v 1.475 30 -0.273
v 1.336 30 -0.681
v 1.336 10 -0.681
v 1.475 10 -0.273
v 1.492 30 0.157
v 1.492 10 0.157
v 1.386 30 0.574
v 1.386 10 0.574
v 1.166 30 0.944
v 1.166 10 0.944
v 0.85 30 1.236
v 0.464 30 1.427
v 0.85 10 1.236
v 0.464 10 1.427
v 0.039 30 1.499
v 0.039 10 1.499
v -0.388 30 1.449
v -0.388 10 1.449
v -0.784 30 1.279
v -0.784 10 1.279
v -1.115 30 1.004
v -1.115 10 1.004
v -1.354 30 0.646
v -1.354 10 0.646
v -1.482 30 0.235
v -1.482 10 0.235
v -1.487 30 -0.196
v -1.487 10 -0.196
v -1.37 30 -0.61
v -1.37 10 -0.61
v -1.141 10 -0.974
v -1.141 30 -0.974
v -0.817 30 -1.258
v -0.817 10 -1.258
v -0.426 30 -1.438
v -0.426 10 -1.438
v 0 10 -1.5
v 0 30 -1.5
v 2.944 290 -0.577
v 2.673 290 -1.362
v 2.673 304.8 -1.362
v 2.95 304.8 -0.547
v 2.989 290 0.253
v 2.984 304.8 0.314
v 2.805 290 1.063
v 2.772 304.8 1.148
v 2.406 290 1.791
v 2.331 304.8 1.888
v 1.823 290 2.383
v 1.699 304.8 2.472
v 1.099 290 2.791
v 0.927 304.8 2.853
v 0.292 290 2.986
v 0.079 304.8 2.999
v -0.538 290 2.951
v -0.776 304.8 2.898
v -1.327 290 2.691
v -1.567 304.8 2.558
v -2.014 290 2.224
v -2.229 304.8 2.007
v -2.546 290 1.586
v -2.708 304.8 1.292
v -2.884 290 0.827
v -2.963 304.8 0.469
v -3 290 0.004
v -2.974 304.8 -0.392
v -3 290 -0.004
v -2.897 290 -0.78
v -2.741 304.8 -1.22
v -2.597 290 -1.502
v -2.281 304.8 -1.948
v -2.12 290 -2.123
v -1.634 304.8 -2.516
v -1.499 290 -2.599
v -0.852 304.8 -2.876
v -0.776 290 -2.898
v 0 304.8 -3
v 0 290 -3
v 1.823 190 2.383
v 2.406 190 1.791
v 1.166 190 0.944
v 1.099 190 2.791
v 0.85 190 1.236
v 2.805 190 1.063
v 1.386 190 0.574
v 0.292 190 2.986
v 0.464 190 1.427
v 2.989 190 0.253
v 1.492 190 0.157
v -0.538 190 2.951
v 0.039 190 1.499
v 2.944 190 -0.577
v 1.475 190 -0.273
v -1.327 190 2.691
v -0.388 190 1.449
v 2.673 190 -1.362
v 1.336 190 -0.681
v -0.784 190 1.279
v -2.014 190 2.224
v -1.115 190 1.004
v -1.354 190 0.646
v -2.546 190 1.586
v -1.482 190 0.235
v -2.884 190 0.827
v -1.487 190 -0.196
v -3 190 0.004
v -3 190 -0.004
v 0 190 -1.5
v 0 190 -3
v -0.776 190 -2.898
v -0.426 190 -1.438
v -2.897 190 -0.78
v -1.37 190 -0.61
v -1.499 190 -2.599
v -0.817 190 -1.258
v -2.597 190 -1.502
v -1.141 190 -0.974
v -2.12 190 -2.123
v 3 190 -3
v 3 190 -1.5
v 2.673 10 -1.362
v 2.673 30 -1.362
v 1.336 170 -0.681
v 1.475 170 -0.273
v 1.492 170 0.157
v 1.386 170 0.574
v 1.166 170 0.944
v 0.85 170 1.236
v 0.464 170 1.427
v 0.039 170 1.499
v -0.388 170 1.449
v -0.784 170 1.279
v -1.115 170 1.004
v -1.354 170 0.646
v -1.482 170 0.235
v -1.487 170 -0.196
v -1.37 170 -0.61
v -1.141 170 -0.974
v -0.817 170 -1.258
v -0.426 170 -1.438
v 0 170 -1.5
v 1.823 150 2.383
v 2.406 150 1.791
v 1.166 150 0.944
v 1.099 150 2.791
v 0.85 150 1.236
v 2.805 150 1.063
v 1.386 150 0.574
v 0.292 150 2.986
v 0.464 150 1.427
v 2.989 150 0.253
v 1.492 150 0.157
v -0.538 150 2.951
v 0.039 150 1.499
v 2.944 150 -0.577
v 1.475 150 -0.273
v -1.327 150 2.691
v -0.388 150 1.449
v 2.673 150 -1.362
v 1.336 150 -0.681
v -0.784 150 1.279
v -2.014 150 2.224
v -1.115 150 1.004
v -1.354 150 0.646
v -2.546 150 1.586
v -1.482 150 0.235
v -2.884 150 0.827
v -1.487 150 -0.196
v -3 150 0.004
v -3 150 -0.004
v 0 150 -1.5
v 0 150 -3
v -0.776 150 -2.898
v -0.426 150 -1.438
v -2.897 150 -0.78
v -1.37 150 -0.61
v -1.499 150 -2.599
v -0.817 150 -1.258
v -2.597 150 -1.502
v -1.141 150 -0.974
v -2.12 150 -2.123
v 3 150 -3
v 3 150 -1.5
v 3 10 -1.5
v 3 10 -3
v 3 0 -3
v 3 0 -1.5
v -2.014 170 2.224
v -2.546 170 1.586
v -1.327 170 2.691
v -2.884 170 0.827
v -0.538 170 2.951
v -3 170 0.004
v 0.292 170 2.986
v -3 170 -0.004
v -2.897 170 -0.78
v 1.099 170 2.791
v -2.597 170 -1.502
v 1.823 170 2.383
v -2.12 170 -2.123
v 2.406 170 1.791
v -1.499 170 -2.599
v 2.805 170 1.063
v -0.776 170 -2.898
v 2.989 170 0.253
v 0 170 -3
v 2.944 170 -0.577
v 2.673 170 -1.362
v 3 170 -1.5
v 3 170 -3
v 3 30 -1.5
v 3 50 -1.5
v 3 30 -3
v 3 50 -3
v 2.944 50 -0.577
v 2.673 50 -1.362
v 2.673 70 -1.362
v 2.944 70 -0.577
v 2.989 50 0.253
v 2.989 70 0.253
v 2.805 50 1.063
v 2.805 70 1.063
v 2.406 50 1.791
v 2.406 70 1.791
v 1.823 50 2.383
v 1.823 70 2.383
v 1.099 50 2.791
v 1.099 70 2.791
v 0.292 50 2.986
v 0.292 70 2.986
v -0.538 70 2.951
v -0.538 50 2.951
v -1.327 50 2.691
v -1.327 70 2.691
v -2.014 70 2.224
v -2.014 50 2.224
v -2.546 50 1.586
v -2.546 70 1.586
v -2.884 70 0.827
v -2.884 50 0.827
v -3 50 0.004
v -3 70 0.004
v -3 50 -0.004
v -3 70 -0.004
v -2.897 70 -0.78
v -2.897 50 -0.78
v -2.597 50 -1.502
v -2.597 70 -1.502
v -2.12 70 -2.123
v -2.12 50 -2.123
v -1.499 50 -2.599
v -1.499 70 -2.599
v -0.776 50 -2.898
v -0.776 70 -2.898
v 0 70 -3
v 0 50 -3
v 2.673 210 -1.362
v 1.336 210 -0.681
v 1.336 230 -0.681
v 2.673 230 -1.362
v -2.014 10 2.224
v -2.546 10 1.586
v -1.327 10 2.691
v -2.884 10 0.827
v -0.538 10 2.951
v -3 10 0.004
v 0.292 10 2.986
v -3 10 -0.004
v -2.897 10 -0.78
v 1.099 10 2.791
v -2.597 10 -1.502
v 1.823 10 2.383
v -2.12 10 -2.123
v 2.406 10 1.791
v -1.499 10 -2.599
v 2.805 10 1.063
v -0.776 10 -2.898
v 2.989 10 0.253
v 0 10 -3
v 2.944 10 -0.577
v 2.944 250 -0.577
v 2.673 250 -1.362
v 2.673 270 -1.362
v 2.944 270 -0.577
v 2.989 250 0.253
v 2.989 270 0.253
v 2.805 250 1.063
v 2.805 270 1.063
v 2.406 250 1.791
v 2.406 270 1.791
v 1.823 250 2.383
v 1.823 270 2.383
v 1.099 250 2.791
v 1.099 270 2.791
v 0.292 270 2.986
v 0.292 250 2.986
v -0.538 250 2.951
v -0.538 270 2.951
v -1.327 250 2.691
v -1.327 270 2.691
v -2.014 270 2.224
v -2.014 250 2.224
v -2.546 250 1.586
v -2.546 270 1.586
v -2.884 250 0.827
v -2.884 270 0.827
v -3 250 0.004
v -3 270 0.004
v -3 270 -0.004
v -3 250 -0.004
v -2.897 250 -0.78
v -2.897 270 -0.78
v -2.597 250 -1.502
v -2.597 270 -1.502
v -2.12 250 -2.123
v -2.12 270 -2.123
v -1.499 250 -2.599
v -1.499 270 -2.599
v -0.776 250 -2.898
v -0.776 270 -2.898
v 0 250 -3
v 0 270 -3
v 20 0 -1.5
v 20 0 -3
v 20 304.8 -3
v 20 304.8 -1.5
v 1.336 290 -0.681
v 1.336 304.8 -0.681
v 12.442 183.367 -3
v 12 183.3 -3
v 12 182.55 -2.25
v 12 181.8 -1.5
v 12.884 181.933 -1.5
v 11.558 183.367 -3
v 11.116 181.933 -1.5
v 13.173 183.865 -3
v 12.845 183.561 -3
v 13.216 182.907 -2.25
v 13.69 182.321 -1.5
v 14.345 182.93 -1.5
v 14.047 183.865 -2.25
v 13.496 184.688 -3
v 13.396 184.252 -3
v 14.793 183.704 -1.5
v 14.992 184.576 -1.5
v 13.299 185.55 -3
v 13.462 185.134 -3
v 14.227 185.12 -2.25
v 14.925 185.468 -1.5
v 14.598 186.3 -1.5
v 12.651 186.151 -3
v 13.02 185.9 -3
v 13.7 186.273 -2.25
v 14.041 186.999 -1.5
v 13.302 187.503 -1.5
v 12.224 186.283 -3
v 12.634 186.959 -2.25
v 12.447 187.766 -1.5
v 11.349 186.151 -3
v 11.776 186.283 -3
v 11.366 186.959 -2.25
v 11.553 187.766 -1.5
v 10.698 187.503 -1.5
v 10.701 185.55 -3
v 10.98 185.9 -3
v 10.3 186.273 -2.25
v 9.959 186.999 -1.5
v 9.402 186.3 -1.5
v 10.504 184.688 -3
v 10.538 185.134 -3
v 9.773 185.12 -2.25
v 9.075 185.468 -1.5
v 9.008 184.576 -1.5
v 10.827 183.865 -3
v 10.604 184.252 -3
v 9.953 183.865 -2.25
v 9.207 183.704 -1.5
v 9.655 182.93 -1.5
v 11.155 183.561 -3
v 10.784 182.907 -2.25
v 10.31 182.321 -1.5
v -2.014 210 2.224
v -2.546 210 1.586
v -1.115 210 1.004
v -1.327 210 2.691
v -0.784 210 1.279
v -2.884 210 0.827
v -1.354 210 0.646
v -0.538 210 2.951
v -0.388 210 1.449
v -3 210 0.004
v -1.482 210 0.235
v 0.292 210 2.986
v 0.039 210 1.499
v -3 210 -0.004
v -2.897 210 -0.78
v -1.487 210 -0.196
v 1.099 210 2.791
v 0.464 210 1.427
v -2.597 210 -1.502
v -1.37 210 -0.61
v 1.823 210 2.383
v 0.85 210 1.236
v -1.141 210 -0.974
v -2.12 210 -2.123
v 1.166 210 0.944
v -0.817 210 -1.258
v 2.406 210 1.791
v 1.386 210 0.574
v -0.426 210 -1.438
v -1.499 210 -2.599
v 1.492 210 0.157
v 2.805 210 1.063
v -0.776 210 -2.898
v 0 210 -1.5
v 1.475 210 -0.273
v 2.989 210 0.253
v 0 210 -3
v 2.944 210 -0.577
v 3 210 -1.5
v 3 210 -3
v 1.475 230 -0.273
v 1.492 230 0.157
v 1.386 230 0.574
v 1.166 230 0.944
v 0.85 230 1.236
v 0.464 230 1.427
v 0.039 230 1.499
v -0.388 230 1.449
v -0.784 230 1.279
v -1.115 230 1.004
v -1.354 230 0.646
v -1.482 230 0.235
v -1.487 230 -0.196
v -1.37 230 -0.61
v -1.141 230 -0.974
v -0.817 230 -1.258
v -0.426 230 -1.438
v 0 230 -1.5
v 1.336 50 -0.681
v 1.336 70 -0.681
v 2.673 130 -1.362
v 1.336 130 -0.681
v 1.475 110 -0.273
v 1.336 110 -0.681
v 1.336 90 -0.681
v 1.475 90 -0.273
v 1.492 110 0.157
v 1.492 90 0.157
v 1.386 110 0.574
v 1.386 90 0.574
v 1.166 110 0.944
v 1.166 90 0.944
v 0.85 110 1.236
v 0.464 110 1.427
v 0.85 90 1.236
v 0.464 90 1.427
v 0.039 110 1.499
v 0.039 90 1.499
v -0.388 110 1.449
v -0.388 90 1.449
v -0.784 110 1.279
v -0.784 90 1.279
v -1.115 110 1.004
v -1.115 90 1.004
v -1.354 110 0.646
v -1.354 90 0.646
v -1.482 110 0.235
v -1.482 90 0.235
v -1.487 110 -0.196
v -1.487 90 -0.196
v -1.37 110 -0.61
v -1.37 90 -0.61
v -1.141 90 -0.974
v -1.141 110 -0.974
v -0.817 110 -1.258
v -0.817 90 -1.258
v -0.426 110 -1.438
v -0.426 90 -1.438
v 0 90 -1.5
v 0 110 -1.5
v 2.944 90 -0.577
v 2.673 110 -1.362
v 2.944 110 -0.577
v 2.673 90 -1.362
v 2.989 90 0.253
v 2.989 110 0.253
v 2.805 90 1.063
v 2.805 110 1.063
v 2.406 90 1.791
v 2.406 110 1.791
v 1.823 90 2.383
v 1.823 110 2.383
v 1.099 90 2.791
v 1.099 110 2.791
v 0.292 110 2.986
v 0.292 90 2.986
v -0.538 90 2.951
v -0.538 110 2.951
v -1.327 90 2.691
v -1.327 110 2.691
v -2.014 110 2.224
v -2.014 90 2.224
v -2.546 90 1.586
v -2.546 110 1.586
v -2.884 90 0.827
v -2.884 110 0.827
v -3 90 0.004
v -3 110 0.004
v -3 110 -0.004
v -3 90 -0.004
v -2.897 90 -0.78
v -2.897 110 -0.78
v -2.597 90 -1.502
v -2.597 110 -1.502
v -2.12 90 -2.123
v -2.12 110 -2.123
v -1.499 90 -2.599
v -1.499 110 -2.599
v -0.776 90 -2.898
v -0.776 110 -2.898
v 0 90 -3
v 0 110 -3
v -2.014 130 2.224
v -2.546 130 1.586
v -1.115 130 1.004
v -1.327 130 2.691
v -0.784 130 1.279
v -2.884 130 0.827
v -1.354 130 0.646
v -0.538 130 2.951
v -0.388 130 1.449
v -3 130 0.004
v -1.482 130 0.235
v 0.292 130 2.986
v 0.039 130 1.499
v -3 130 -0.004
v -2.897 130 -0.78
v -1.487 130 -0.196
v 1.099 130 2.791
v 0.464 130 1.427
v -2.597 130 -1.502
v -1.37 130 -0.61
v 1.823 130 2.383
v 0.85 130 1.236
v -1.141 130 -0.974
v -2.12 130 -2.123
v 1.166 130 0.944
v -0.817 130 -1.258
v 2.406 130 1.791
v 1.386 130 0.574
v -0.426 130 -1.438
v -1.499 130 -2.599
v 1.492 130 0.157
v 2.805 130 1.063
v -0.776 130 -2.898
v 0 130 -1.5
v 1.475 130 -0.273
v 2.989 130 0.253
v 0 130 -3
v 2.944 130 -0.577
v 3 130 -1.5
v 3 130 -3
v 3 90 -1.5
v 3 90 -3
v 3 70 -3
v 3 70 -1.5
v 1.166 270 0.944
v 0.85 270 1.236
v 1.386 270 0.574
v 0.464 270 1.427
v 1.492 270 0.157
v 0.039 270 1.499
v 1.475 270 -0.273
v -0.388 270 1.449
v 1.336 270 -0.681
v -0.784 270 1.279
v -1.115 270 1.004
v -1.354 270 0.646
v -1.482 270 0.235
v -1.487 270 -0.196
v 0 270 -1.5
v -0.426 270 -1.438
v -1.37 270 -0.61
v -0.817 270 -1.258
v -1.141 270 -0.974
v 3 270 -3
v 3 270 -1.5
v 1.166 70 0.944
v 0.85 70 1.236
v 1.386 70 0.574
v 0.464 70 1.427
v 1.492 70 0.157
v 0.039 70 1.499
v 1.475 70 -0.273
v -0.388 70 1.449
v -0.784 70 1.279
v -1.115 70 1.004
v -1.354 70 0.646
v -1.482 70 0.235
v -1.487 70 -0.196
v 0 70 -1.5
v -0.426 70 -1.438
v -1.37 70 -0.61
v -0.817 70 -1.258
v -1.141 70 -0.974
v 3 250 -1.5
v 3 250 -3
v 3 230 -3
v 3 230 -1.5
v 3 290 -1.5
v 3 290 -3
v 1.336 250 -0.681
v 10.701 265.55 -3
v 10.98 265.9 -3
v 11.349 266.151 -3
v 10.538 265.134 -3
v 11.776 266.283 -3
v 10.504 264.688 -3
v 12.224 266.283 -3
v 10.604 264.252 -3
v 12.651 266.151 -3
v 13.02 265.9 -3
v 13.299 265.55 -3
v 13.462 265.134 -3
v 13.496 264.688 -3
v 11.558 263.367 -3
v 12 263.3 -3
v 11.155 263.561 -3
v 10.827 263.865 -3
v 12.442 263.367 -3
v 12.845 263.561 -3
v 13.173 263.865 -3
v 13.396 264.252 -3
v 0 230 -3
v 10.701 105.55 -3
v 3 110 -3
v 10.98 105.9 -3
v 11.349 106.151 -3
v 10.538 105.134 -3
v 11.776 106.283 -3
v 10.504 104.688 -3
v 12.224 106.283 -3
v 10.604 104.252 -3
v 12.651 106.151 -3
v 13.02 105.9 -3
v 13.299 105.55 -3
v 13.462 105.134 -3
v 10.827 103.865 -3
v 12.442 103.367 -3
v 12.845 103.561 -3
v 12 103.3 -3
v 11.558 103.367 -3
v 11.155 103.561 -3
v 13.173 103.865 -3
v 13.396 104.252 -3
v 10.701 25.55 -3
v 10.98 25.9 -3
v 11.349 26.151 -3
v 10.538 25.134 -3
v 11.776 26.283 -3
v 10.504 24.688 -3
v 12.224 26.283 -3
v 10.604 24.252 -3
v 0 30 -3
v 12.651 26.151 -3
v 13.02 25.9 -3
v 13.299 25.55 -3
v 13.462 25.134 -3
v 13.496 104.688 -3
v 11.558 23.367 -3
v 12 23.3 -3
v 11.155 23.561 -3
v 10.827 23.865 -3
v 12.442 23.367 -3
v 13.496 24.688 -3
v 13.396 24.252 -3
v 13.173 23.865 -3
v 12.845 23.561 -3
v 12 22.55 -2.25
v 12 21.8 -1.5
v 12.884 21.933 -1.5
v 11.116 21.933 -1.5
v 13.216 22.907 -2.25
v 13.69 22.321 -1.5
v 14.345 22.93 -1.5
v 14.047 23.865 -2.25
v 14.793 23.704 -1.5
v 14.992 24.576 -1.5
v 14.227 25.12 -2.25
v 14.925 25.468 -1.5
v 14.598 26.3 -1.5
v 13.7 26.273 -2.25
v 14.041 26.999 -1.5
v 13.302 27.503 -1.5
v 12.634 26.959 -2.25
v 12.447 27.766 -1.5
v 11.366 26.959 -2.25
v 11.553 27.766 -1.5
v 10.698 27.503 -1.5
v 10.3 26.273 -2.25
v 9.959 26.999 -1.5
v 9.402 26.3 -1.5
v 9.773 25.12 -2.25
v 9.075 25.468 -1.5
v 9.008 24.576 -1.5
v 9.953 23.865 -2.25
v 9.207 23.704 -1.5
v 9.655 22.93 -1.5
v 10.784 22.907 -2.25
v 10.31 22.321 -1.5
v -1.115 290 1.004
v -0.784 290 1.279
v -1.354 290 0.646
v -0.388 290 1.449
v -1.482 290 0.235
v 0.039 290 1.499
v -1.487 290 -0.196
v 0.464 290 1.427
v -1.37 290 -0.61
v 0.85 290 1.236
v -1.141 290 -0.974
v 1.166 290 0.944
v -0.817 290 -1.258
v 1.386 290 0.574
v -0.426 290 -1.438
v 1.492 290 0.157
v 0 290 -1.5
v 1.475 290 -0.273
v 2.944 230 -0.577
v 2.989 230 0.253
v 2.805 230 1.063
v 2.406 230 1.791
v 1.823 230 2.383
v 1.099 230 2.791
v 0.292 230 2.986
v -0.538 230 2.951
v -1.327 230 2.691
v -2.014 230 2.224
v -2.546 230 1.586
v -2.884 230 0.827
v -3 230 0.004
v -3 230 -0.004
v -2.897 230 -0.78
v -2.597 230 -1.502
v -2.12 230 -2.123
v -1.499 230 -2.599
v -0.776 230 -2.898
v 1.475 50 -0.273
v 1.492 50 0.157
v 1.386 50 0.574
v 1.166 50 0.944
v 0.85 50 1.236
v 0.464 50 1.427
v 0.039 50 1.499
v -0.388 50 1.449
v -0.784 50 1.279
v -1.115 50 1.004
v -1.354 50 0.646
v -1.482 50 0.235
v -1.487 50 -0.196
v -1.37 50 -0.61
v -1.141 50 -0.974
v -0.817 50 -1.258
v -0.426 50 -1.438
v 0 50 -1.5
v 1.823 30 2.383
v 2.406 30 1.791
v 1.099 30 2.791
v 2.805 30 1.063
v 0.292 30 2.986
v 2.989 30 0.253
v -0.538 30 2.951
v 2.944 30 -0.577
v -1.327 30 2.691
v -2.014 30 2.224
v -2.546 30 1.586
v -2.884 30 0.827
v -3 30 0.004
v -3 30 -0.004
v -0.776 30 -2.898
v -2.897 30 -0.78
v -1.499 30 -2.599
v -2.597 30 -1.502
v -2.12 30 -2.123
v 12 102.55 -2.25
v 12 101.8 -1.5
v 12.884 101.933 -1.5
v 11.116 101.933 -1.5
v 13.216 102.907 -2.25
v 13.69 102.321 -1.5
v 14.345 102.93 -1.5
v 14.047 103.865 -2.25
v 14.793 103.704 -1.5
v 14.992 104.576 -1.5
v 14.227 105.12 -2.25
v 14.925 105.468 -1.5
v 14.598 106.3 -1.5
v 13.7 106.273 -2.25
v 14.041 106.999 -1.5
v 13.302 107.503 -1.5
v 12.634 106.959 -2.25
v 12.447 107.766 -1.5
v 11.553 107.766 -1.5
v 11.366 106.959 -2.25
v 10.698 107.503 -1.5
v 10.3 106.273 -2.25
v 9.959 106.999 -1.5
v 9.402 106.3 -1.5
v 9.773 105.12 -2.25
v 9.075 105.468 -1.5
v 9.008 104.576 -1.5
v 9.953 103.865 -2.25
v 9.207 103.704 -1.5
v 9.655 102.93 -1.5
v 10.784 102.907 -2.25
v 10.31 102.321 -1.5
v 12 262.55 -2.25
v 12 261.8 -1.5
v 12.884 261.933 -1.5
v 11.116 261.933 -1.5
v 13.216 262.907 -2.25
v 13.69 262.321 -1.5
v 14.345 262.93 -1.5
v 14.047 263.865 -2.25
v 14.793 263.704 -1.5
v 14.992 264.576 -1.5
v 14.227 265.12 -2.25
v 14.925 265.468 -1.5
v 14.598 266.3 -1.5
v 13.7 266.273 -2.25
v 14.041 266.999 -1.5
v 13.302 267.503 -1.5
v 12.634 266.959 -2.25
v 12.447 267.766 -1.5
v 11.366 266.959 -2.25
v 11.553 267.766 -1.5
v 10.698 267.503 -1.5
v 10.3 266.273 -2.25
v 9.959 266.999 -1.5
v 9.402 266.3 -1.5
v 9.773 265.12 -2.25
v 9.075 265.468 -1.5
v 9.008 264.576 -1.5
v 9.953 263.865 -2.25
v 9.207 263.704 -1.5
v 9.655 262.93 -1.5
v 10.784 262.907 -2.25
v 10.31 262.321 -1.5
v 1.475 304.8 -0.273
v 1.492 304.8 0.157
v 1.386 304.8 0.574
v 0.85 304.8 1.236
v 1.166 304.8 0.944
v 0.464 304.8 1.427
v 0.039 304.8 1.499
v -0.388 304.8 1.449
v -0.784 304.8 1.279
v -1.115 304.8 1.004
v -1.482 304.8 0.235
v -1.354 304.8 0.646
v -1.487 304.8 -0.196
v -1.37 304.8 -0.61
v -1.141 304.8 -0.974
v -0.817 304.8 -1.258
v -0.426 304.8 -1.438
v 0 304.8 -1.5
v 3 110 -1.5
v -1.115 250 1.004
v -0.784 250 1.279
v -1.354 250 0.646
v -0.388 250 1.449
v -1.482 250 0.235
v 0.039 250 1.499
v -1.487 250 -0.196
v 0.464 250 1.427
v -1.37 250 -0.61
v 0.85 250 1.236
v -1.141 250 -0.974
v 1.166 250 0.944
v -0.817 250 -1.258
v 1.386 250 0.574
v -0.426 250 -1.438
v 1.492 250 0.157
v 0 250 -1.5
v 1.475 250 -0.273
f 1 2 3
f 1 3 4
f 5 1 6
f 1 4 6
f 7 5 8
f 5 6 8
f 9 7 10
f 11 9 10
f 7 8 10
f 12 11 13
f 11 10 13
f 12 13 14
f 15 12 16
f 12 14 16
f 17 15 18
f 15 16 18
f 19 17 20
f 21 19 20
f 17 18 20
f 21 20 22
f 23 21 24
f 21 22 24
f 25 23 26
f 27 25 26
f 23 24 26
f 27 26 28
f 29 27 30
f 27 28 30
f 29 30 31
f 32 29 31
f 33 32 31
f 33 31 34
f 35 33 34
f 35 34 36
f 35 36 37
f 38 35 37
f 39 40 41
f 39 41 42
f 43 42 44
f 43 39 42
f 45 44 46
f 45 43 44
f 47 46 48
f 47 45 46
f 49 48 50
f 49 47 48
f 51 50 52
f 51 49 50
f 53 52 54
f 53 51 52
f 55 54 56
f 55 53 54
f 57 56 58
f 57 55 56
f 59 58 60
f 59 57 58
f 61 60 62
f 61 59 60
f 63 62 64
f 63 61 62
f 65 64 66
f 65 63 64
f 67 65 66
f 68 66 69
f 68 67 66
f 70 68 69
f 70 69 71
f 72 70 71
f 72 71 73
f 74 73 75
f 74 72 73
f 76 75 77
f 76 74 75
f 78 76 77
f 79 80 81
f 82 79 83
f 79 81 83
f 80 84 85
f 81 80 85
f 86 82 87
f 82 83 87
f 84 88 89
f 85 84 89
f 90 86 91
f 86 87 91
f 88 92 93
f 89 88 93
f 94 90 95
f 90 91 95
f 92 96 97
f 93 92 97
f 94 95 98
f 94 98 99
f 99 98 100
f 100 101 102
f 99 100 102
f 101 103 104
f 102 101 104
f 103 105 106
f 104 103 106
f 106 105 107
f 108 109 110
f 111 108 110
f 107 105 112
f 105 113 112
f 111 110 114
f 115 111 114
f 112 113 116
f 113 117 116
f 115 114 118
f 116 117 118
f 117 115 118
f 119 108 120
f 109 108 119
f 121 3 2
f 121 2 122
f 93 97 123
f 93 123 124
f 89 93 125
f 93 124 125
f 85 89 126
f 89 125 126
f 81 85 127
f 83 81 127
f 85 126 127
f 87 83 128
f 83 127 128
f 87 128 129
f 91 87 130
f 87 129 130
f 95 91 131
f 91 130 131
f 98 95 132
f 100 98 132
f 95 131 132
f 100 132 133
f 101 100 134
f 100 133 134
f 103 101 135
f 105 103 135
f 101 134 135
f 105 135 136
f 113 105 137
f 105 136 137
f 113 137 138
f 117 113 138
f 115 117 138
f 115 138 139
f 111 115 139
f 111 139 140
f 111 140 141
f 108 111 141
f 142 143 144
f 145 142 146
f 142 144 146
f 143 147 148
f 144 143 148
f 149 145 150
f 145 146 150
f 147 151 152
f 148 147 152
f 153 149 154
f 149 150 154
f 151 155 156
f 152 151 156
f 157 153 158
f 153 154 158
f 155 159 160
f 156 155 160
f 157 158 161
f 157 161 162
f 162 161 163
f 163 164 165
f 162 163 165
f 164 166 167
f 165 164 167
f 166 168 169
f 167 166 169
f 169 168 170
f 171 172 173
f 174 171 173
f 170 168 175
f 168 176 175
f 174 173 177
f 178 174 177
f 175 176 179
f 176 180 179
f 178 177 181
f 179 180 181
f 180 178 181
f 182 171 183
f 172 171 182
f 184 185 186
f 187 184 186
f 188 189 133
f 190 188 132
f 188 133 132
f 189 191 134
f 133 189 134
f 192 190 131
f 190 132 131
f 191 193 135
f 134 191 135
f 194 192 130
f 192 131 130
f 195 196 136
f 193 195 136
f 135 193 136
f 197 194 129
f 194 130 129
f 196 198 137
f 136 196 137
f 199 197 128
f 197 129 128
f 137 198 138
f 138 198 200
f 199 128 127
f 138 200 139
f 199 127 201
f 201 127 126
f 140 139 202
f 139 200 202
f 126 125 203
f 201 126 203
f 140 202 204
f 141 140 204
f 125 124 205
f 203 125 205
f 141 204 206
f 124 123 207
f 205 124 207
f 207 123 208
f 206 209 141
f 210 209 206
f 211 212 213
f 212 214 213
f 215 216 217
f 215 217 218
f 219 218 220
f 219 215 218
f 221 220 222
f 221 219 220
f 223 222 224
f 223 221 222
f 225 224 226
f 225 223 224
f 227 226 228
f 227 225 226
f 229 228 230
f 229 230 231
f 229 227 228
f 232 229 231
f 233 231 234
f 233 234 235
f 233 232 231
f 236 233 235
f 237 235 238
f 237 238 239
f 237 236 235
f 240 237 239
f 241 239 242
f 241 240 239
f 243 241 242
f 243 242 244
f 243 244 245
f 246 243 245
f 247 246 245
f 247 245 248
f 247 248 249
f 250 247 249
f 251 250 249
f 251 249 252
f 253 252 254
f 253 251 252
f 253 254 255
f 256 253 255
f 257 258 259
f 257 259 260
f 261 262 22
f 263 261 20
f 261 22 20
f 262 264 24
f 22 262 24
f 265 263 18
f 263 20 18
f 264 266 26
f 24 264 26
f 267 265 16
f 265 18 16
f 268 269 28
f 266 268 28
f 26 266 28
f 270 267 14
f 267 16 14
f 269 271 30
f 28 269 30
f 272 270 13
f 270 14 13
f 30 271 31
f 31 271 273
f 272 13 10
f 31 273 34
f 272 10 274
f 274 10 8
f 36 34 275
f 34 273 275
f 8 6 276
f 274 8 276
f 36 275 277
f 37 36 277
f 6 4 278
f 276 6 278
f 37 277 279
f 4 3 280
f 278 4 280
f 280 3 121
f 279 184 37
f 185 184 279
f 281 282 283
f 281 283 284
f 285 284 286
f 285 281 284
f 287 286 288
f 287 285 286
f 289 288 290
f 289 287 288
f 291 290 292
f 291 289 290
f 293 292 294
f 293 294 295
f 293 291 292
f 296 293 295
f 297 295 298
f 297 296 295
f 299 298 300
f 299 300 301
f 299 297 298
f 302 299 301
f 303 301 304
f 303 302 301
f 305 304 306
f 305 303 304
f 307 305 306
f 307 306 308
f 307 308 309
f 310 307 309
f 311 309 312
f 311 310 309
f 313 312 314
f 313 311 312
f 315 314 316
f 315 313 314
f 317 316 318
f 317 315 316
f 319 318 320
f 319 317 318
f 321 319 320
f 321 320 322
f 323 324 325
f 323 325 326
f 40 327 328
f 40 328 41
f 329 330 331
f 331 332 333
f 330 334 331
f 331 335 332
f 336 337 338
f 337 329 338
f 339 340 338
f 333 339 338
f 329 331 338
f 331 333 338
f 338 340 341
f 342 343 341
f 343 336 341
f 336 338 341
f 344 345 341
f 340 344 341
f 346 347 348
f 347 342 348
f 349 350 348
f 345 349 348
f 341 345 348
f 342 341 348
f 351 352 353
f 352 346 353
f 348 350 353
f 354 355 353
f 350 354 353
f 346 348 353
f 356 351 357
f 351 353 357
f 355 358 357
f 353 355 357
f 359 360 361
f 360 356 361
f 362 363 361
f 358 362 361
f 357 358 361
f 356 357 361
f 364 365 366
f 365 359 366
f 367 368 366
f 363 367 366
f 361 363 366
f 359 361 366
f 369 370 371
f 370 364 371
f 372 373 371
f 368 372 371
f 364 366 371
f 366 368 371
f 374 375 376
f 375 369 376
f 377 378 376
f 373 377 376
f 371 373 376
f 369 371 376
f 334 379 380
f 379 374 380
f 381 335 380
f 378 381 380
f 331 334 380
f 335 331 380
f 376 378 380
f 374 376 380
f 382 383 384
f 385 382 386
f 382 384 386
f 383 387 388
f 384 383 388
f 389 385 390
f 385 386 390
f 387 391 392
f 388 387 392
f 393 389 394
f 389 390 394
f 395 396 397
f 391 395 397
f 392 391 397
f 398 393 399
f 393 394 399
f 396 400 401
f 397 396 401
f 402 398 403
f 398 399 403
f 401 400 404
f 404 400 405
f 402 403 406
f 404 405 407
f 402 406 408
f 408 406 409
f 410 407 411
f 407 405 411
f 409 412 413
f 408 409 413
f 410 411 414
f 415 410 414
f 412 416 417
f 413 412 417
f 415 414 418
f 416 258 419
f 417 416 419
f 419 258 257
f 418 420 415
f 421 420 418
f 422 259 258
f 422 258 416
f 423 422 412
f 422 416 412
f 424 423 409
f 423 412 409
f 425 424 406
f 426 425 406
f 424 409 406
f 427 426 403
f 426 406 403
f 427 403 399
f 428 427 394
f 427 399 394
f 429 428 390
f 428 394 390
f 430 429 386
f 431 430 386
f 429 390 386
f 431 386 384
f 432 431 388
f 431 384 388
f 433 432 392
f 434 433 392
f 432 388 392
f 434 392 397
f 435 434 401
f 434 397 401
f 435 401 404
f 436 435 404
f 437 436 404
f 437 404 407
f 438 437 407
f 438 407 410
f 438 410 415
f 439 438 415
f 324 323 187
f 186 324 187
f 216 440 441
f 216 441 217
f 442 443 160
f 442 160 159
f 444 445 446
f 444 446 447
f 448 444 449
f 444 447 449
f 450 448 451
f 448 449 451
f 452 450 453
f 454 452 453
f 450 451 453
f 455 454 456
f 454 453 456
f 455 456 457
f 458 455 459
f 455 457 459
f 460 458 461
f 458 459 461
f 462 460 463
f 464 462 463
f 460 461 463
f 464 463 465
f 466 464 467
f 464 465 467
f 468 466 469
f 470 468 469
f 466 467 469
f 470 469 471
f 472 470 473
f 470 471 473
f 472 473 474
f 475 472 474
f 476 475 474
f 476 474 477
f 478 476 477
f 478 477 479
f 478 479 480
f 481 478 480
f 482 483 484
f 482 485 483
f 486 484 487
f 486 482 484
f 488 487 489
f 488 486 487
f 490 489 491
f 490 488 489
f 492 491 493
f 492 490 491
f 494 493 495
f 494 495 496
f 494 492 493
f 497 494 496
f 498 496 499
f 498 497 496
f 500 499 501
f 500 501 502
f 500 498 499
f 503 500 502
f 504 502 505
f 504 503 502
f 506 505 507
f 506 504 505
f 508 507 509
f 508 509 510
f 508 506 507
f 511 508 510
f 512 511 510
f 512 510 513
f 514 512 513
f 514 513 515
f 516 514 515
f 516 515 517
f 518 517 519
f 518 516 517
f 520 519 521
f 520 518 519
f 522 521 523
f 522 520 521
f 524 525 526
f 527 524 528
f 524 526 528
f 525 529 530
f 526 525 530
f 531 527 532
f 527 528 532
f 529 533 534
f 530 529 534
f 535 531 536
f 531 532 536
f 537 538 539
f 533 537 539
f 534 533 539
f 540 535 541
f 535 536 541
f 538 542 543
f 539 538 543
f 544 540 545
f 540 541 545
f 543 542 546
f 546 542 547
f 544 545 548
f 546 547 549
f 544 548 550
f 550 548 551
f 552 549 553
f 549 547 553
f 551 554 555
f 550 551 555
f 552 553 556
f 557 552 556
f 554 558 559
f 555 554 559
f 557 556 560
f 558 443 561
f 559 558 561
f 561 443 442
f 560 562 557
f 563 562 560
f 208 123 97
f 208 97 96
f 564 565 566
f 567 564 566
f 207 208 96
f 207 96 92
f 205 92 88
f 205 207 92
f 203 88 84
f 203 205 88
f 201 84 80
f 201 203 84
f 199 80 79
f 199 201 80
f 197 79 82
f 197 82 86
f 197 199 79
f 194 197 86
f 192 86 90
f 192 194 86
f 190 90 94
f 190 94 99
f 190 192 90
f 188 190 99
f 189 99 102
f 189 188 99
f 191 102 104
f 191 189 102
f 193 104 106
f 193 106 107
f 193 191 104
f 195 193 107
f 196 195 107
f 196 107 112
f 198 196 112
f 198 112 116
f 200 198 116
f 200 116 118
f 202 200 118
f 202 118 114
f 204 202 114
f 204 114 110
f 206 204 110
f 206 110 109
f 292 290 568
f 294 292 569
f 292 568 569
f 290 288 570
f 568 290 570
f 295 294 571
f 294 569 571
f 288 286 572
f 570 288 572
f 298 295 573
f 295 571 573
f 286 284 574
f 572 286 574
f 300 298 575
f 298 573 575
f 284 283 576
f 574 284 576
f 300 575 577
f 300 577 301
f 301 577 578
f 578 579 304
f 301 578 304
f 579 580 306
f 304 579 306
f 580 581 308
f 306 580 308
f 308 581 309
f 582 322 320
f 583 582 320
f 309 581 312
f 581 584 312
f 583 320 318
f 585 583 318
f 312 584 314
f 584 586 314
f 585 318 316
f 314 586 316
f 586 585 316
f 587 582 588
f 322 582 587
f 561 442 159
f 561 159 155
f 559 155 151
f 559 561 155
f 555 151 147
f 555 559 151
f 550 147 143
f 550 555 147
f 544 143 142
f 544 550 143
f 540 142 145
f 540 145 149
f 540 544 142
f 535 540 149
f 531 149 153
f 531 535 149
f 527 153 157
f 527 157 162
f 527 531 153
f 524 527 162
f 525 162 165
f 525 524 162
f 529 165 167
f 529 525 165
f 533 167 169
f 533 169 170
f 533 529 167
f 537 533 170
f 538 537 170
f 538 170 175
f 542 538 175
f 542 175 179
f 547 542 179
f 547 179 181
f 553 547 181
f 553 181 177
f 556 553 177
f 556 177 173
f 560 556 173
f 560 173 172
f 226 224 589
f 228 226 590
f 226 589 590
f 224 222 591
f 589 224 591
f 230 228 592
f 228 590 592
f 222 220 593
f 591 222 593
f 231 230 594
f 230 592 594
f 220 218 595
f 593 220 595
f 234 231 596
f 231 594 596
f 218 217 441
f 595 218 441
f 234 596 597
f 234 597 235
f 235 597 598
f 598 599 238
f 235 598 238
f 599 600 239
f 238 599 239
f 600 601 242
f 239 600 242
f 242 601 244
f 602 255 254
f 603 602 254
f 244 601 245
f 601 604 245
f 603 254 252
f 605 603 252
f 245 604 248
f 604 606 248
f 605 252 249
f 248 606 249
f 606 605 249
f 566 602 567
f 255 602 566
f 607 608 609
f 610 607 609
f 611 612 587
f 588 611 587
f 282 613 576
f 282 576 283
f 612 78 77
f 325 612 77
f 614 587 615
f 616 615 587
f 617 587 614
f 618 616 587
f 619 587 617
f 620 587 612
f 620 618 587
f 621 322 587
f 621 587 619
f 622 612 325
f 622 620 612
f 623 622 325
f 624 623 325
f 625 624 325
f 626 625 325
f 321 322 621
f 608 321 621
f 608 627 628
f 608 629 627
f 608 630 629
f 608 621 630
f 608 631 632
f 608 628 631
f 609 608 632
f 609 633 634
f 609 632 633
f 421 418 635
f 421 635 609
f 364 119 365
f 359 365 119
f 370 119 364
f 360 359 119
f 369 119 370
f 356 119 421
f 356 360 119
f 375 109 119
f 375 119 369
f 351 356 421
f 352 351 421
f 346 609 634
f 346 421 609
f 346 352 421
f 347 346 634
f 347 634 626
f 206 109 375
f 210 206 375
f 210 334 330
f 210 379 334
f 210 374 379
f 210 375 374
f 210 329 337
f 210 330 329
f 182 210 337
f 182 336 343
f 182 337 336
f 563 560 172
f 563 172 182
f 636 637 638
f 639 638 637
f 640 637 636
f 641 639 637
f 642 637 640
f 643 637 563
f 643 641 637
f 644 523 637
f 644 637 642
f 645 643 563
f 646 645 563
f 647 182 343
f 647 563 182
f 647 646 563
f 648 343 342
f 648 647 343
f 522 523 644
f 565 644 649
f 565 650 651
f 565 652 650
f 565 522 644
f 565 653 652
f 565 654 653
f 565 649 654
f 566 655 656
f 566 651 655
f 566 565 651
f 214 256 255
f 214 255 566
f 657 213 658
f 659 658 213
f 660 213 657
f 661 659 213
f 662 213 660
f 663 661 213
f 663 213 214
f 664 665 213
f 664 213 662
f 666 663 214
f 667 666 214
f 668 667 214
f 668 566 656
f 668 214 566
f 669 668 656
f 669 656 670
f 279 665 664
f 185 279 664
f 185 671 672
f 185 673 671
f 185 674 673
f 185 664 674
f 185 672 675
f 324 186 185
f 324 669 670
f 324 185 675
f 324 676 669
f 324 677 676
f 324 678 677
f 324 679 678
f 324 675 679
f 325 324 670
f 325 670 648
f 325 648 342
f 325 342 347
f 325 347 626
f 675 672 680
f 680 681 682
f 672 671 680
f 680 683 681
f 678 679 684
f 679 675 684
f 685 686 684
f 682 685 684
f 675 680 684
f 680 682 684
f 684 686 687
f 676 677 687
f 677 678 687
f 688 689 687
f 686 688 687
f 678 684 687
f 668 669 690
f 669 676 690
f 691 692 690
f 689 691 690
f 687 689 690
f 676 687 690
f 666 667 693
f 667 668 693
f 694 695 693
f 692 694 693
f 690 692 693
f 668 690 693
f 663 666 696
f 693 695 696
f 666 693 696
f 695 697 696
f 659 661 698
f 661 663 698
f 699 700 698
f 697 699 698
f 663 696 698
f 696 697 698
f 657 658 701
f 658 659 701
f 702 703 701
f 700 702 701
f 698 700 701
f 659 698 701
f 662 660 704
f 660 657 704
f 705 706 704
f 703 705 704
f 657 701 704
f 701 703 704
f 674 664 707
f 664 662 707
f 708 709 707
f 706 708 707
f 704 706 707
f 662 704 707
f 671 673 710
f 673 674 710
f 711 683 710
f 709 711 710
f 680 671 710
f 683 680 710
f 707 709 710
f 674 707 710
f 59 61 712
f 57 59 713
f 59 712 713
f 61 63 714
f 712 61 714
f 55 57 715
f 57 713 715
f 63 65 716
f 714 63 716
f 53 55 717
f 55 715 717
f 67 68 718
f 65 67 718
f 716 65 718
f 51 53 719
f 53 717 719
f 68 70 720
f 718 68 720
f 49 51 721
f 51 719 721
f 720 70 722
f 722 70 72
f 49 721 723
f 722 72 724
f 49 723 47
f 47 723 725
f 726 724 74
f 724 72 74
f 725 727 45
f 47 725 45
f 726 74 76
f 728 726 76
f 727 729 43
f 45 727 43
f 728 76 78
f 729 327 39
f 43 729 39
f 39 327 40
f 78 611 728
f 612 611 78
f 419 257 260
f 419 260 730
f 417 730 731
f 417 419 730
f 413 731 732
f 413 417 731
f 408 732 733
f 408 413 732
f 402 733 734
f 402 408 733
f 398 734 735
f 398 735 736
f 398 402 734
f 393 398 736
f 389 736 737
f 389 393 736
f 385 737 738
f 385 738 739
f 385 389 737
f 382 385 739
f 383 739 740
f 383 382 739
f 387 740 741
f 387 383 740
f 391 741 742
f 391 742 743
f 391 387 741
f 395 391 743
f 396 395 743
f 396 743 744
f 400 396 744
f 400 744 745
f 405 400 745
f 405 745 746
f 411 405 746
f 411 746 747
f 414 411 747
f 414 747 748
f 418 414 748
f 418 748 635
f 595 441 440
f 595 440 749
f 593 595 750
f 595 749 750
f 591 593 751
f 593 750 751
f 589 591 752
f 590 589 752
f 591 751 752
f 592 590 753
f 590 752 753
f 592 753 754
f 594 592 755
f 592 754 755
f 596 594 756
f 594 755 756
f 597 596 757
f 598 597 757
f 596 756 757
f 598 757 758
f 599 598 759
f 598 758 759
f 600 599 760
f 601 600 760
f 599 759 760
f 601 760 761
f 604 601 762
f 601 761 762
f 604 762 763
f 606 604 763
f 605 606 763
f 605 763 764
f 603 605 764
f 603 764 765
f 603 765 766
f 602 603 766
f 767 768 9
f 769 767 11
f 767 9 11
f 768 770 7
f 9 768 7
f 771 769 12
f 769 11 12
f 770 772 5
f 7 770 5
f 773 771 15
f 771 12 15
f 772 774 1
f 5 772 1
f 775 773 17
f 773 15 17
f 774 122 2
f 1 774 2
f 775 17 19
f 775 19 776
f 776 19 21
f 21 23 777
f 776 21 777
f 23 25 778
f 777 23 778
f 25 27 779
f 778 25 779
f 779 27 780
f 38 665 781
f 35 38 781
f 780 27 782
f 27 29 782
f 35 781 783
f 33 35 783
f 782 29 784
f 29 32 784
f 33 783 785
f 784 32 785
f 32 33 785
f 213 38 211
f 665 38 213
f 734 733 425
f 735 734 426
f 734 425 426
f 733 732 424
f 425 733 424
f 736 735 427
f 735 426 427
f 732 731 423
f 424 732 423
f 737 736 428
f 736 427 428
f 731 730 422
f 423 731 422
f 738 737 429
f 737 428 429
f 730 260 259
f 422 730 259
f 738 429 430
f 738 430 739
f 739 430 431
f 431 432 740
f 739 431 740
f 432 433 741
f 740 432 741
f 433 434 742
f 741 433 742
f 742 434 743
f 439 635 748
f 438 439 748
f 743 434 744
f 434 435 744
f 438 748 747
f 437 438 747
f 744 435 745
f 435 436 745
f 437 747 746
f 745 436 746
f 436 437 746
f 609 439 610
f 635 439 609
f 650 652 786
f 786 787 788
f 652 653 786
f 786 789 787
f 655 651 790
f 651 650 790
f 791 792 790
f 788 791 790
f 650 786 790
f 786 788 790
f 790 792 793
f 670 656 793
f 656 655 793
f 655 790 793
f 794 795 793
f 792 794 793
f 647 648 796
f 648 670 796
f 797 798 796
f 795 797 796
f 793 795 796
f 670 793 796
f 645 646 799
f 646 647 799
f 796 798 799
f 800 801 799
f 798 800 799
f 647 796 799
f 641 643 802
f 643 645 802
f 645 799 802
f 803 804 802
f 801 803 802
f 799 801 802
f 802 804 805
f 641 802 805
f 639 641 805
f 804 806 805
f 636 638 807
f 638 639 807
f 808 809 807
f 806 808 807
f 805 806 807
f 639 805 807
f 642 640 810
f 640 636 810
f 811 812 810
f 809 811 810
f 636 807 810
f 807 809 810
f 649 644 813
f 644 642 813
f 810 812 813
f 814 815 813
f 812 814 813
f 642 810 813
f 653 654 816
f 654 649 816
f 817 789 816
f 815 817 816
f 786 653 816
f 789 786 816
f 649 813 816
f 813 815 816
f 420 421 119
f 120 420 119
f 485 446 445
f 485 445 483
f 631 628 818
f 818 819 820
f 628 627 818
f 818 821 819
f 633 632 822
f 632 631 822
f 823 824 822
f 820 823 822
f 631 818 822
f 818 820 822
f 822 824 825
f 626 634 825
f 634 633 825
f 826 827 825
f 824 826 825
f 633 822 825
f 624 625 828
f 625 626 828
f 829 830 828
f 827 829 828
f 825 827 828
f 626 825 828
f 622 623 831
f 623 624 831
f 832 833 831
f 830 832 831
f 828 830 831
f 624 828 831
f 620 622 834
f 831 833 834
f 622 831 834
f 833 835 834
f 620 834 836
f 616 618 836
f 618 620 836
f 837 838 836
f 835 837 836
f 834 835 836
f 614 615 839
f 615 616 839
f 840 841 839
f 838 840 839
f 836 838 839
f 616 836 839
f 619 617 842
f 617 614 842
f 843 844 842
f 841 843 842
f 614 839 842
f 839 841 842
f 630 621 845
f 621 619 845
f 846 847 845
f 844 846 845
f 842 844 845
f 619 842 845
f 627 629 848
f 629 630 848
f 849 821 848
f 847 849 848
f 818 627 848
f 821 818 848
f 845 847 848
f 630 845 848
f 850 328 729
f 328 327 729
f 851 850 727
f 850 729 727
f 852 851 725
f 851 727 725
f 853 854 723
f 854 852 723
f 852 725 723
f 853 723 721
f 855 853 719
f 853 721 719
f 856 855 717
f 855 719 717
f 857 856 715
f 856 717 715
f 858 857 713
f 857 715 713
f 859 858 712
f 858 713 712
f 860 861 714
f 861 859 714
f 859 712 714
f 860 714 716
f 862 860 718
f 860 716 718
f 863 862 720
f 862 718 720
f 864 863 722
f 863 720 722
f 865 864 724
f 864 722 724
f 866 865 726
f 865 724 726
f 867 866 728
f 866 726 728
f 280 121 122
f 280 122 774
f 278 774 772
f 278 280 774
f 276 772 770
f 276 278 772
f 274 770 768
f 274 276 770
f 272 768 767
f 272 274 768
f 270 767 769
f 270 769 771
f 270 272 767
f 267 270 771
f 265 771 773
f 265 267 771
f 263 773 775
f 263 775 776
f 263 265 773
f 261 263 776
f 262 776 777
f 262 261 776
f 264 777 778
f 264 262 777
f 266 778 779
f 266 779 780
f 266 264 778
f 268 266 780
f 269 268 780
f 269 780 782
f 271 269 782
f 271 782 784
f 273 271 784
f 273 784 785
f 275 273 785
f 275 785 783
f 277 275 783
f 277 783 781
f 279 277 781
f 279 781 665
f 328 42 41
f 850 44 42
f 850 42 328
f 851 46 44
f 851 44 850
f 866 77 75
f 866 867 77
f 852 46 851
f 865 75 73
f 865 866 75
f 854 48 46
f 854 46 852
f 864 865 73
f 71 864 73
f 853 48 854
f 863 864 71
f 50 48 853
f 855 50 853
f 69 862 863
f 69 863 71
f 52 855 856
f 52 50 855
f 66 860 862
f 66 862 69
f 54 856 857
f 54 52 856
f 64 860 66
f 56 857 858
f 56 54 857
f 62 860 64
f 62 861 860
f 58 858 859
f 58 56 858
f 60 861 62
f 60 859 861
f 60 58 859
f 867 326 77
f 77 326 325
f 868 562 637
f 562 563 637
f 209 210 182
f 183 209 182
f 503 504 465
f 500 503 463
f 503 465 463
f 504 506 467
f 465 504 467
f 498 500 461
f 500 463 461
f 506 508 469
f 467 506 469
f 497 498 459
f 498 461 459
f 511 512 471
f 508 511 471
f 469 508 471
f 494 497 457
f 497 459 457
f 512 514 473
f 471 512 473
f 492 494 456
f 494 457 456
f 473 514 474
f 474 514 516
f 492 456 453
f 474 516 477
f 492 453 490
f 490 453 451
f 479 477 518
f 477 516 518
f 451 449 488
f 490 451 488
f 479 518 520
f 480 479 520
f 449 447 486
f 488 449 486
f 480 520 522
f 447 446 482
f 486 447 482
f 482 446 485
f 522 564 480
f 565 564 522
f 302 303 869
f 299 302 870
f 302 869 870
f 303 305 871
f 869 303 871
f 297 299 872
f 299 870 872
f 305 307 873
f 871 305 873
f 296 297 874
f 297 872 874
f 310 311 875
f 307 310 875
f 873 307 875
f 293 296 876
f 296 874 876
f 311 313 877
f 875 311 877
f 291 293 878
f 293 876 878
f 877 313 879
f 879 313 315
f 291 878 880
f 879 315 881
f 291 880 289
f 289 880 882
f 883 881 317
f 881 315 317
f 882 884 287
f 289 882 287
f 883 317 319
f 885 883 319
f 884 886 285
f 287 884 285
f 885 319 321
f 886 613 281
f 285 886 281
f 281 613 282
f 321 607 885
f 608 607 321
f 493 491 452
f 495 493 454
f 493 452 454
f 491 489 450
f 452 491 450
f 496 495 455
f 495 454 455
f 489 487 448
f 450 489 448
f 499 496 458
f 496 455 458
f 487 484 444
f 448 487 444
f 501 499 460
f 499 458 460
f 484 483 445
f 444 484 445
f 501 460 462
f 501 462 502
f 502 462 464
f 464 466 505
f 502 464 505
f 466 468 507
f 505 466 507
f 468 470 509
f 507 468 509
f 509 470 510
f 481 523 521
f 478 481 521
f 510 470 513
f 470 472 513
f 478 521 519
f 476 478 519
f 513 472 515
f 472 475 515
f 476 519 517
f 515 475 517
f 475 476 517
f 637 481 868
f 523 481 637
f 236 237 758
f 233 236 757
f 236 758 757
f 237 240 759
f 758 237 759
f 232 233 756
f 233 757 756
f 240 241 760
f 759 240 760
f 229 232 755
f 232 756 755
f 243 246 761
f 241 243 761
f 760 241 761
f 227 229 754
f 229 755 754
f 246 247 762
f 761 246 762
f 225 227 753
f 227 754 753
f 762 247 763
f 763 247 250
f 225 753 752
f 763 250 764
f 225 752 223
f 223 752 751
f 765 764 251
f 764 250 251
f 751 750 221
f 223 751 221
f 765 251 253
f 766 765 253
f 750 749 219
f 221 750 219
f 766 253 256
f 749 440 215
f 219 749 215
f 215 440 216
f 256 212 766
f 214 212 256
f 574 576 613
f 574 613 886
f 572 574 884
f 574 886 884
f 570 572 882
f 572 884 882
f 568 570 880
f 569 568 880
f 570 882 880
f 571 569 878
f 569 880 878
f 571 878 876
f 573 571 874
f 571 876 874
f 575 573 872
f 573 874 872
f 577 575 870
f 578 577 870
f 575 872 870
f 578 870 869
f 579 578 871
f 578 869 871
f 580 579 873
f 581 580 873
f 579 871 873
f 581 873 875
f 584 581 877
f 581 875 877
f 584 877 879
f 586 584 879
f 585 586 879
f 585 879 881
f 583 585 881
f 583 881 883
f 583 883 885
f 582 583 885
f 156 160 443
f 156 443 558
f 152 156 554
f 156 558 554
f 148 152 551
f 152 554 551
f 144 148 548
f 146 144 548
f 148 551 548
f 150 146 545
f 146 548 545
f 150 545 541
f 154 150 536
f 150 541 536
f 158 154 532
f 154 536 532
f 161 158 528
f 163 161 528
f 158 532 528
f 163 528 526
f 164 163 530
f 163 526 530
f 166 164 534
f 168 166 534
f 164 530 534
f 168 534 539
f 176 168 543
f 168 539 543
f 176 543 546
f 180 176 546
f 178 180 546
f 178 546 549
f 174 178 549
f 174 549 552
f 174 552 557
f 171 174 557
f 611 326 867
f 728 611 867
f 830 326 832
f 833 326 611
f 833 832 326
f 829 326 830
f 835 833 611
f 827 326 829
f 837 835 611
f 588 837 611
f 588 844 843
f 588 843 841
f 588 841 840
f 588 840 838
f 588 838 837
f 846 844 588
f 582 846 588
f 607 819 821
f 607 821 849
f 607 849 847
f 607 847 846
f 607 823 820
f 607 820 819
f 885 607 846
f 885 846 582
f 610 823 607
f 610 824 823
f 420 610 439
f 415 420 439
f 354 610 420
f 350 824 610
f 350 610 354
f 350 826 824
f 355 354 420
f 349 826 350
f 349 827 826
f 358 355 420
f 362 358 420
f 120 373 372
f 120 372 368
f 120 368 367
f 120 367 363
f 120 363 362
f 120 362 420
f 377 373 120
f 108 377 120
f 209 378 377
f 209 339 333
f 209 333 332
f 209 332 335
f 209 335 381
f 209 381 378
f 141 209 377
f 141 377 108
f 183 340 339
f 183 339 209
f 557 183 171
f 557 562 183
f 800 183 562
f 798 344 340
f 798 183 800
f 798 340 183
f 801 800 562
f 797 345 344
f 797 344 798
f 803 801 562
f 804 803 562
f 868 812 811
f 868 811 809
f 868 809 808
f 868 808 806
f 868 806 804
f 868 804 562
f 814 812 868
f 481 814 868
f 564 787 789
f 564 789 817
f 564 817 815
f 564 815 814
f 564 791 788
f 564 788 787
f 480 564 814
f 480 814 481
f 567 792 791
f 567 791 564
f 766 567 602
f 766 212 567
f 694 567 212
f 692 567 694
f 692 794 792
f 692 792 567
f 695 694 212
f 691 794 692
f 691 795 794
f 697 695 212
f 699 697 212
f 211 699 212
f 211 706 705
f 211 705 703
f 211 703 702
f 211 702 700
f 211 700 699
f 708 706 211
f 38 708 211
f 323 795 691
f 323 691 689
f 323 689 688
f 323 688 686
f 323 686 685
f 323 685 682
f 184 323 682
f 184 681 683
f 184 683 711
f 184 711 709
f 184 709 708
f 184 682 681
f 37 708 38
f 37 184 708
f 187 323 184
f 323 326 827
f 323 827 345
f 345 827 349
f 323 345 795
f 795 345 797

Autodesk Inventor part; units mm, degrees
ref_plane "YZ Plane" through (0, 0, 0) normal (1, 0, 0) x (0, 1, 0)
ref_plane "XZ Plane" through (0, 0, 0) normal (0, 1, 0) x (-1, 0, 0)
ref_plane "XY Plane" through (0, 0, 0) normal (0, 0, 1) x (1, 0, 0)
sketch "Sketch2" plane through (0, 0, 0) normal (0, 1, 0) x (-1, 0, 0)
  arc A0 (0, -1.5) -> (-1.3365, -0.681) centre (0, 0) ccw
  arc A1 (0, -3) -> (-2.673, -1.362) centre (0, 0) ccw
  line L0 (0, -3) -> (-20, -3)
  line L1 (-20, -3) -> (-20, -1.5)
  line L2 (-20, -1.5) -> (0, -1.5)
  line L3 (-1.3365, -0.681) -> (-2.673, -1.362)
  dimension "d0" = 1.5
  dimension "d1" = 1.5
  dimension "d2" = 20
  dimension "d3" = 3
  dimension "d4" = 27
extrude "Extrusion1" add sketch "Sketch2" along normal blind 304.8
sketch "Sketch3" plane through (20, 0, -3) normal (0, 0, -1) x (-1, 0, 0)
  line L0 (0, 0) -> (20, 0) projected
  line L1 (23, 50) -> (17, 50)
  line L2 (17, 50) -> (17, 30)
  line L3 (17, 30) -> (23, 30)
  line L4 (23, 30) -> (23, 50)
  line L5 (17, 0) -> (17, 304.8) projected
  dimension "d8" = 20
  dimension "d9" = 6
  dimension "d24" = 30
extrude "Extrusion2" cut sketch "Sketch3" against normal through all
pattern_linear "Rectangular Pattern1" count 25 spacing 40 along (0, 1, 0) of "Extrusion2"
sketch "Sketch5" plane through (20, 0, -3) normal (0, 0, -1) x (-1, 0, 0)
  line L0 (0, 0) -> (20, 0) projected
  line L1 (17, 0) -> (23, 0)
  line L2 (23, 0) -> (23, 10)
  line L3 (23, 10) -> (17, 10)
  line L4 (17, 10) -> (17, 0)
  point P0 (17, 30)
  dimension "d25" = 10
  dimension "d26" = 6
extrude "Extrusion3" cut sketch "Sketch5" against normal through all
sketch "Sketch4" plane through (20, 0, -1.5) normal (0, 0, 1) x (1, 0, 0)
  line L0 (0, 0) -> (0, 304.8) projected
  line L1 (0, 304.8) -> (-20, 304.8) projected
  point P0 (-8, -615.2)
  point P1 (-8, -535.2)
  point P2 (-8, -455.2)
  point P3 (-8, -375.2)
  point P4 (-8, -295.2)
  point P5 (-8, -215.2)
  point P6 (-8, -135.2)
  point P7 (-8, -55.2)
  point P8 (-8, 24.8)
  point P9 (-8, 104.8)
  point P10 (-8, 184.8)
  point P11 (-8, 264.8)
  point P12 (-17, 1000)
  point P13 (-20, 304.8)
  dimension "d15" = 8
  dimension "d29" = 40
  dimension "d30" = 80
  dimension "d31" = 80
  dimension "d32" = 80
  dimension "d33" = 80
  dimension "d34" = 80
  dimension "d35" = 80
  dimension "d36" = 80
  dimension "d37" = 80
  dimension "d38" = 80
  dimension "d39" = 80
  dimension "d40" = 80
hole "Hole1" at (12, -615.2, -1.5) at (12, -535.2, -1.5) at (12, -455.2, -1.5) at (12, -375.2, -1.5) at (12, -295.2, -1.5) at (12, -215.2, -1.5) at (12, -135.2, -1.5) at (12, -55.2, -1.5) at (12, 24.8, -1.5) at (12, 104.8, -1.5) at (12, 184.8, -1.5) at (12, 264.8, -1.5) direction (0, 0, -1) diameter 3 end through all countersink diameter 6 countersink angle 90
equation "\"d1\" = d0"
equation "\"d31\" = d30"
equation "\"d32\" = d30"
equation "\"d33\" = d30"
equation "\"d34\" = d30"
equation "\"d35\" = d30"
equation "\"d36\" = d30"
equation "\"d37\" = d36"
equation "\"d38\" = d37"
equation "\"d39\" = d38"
equation "\"d40\" = d39"
properties part number "SIDE 2" material "Steel, Mild"
